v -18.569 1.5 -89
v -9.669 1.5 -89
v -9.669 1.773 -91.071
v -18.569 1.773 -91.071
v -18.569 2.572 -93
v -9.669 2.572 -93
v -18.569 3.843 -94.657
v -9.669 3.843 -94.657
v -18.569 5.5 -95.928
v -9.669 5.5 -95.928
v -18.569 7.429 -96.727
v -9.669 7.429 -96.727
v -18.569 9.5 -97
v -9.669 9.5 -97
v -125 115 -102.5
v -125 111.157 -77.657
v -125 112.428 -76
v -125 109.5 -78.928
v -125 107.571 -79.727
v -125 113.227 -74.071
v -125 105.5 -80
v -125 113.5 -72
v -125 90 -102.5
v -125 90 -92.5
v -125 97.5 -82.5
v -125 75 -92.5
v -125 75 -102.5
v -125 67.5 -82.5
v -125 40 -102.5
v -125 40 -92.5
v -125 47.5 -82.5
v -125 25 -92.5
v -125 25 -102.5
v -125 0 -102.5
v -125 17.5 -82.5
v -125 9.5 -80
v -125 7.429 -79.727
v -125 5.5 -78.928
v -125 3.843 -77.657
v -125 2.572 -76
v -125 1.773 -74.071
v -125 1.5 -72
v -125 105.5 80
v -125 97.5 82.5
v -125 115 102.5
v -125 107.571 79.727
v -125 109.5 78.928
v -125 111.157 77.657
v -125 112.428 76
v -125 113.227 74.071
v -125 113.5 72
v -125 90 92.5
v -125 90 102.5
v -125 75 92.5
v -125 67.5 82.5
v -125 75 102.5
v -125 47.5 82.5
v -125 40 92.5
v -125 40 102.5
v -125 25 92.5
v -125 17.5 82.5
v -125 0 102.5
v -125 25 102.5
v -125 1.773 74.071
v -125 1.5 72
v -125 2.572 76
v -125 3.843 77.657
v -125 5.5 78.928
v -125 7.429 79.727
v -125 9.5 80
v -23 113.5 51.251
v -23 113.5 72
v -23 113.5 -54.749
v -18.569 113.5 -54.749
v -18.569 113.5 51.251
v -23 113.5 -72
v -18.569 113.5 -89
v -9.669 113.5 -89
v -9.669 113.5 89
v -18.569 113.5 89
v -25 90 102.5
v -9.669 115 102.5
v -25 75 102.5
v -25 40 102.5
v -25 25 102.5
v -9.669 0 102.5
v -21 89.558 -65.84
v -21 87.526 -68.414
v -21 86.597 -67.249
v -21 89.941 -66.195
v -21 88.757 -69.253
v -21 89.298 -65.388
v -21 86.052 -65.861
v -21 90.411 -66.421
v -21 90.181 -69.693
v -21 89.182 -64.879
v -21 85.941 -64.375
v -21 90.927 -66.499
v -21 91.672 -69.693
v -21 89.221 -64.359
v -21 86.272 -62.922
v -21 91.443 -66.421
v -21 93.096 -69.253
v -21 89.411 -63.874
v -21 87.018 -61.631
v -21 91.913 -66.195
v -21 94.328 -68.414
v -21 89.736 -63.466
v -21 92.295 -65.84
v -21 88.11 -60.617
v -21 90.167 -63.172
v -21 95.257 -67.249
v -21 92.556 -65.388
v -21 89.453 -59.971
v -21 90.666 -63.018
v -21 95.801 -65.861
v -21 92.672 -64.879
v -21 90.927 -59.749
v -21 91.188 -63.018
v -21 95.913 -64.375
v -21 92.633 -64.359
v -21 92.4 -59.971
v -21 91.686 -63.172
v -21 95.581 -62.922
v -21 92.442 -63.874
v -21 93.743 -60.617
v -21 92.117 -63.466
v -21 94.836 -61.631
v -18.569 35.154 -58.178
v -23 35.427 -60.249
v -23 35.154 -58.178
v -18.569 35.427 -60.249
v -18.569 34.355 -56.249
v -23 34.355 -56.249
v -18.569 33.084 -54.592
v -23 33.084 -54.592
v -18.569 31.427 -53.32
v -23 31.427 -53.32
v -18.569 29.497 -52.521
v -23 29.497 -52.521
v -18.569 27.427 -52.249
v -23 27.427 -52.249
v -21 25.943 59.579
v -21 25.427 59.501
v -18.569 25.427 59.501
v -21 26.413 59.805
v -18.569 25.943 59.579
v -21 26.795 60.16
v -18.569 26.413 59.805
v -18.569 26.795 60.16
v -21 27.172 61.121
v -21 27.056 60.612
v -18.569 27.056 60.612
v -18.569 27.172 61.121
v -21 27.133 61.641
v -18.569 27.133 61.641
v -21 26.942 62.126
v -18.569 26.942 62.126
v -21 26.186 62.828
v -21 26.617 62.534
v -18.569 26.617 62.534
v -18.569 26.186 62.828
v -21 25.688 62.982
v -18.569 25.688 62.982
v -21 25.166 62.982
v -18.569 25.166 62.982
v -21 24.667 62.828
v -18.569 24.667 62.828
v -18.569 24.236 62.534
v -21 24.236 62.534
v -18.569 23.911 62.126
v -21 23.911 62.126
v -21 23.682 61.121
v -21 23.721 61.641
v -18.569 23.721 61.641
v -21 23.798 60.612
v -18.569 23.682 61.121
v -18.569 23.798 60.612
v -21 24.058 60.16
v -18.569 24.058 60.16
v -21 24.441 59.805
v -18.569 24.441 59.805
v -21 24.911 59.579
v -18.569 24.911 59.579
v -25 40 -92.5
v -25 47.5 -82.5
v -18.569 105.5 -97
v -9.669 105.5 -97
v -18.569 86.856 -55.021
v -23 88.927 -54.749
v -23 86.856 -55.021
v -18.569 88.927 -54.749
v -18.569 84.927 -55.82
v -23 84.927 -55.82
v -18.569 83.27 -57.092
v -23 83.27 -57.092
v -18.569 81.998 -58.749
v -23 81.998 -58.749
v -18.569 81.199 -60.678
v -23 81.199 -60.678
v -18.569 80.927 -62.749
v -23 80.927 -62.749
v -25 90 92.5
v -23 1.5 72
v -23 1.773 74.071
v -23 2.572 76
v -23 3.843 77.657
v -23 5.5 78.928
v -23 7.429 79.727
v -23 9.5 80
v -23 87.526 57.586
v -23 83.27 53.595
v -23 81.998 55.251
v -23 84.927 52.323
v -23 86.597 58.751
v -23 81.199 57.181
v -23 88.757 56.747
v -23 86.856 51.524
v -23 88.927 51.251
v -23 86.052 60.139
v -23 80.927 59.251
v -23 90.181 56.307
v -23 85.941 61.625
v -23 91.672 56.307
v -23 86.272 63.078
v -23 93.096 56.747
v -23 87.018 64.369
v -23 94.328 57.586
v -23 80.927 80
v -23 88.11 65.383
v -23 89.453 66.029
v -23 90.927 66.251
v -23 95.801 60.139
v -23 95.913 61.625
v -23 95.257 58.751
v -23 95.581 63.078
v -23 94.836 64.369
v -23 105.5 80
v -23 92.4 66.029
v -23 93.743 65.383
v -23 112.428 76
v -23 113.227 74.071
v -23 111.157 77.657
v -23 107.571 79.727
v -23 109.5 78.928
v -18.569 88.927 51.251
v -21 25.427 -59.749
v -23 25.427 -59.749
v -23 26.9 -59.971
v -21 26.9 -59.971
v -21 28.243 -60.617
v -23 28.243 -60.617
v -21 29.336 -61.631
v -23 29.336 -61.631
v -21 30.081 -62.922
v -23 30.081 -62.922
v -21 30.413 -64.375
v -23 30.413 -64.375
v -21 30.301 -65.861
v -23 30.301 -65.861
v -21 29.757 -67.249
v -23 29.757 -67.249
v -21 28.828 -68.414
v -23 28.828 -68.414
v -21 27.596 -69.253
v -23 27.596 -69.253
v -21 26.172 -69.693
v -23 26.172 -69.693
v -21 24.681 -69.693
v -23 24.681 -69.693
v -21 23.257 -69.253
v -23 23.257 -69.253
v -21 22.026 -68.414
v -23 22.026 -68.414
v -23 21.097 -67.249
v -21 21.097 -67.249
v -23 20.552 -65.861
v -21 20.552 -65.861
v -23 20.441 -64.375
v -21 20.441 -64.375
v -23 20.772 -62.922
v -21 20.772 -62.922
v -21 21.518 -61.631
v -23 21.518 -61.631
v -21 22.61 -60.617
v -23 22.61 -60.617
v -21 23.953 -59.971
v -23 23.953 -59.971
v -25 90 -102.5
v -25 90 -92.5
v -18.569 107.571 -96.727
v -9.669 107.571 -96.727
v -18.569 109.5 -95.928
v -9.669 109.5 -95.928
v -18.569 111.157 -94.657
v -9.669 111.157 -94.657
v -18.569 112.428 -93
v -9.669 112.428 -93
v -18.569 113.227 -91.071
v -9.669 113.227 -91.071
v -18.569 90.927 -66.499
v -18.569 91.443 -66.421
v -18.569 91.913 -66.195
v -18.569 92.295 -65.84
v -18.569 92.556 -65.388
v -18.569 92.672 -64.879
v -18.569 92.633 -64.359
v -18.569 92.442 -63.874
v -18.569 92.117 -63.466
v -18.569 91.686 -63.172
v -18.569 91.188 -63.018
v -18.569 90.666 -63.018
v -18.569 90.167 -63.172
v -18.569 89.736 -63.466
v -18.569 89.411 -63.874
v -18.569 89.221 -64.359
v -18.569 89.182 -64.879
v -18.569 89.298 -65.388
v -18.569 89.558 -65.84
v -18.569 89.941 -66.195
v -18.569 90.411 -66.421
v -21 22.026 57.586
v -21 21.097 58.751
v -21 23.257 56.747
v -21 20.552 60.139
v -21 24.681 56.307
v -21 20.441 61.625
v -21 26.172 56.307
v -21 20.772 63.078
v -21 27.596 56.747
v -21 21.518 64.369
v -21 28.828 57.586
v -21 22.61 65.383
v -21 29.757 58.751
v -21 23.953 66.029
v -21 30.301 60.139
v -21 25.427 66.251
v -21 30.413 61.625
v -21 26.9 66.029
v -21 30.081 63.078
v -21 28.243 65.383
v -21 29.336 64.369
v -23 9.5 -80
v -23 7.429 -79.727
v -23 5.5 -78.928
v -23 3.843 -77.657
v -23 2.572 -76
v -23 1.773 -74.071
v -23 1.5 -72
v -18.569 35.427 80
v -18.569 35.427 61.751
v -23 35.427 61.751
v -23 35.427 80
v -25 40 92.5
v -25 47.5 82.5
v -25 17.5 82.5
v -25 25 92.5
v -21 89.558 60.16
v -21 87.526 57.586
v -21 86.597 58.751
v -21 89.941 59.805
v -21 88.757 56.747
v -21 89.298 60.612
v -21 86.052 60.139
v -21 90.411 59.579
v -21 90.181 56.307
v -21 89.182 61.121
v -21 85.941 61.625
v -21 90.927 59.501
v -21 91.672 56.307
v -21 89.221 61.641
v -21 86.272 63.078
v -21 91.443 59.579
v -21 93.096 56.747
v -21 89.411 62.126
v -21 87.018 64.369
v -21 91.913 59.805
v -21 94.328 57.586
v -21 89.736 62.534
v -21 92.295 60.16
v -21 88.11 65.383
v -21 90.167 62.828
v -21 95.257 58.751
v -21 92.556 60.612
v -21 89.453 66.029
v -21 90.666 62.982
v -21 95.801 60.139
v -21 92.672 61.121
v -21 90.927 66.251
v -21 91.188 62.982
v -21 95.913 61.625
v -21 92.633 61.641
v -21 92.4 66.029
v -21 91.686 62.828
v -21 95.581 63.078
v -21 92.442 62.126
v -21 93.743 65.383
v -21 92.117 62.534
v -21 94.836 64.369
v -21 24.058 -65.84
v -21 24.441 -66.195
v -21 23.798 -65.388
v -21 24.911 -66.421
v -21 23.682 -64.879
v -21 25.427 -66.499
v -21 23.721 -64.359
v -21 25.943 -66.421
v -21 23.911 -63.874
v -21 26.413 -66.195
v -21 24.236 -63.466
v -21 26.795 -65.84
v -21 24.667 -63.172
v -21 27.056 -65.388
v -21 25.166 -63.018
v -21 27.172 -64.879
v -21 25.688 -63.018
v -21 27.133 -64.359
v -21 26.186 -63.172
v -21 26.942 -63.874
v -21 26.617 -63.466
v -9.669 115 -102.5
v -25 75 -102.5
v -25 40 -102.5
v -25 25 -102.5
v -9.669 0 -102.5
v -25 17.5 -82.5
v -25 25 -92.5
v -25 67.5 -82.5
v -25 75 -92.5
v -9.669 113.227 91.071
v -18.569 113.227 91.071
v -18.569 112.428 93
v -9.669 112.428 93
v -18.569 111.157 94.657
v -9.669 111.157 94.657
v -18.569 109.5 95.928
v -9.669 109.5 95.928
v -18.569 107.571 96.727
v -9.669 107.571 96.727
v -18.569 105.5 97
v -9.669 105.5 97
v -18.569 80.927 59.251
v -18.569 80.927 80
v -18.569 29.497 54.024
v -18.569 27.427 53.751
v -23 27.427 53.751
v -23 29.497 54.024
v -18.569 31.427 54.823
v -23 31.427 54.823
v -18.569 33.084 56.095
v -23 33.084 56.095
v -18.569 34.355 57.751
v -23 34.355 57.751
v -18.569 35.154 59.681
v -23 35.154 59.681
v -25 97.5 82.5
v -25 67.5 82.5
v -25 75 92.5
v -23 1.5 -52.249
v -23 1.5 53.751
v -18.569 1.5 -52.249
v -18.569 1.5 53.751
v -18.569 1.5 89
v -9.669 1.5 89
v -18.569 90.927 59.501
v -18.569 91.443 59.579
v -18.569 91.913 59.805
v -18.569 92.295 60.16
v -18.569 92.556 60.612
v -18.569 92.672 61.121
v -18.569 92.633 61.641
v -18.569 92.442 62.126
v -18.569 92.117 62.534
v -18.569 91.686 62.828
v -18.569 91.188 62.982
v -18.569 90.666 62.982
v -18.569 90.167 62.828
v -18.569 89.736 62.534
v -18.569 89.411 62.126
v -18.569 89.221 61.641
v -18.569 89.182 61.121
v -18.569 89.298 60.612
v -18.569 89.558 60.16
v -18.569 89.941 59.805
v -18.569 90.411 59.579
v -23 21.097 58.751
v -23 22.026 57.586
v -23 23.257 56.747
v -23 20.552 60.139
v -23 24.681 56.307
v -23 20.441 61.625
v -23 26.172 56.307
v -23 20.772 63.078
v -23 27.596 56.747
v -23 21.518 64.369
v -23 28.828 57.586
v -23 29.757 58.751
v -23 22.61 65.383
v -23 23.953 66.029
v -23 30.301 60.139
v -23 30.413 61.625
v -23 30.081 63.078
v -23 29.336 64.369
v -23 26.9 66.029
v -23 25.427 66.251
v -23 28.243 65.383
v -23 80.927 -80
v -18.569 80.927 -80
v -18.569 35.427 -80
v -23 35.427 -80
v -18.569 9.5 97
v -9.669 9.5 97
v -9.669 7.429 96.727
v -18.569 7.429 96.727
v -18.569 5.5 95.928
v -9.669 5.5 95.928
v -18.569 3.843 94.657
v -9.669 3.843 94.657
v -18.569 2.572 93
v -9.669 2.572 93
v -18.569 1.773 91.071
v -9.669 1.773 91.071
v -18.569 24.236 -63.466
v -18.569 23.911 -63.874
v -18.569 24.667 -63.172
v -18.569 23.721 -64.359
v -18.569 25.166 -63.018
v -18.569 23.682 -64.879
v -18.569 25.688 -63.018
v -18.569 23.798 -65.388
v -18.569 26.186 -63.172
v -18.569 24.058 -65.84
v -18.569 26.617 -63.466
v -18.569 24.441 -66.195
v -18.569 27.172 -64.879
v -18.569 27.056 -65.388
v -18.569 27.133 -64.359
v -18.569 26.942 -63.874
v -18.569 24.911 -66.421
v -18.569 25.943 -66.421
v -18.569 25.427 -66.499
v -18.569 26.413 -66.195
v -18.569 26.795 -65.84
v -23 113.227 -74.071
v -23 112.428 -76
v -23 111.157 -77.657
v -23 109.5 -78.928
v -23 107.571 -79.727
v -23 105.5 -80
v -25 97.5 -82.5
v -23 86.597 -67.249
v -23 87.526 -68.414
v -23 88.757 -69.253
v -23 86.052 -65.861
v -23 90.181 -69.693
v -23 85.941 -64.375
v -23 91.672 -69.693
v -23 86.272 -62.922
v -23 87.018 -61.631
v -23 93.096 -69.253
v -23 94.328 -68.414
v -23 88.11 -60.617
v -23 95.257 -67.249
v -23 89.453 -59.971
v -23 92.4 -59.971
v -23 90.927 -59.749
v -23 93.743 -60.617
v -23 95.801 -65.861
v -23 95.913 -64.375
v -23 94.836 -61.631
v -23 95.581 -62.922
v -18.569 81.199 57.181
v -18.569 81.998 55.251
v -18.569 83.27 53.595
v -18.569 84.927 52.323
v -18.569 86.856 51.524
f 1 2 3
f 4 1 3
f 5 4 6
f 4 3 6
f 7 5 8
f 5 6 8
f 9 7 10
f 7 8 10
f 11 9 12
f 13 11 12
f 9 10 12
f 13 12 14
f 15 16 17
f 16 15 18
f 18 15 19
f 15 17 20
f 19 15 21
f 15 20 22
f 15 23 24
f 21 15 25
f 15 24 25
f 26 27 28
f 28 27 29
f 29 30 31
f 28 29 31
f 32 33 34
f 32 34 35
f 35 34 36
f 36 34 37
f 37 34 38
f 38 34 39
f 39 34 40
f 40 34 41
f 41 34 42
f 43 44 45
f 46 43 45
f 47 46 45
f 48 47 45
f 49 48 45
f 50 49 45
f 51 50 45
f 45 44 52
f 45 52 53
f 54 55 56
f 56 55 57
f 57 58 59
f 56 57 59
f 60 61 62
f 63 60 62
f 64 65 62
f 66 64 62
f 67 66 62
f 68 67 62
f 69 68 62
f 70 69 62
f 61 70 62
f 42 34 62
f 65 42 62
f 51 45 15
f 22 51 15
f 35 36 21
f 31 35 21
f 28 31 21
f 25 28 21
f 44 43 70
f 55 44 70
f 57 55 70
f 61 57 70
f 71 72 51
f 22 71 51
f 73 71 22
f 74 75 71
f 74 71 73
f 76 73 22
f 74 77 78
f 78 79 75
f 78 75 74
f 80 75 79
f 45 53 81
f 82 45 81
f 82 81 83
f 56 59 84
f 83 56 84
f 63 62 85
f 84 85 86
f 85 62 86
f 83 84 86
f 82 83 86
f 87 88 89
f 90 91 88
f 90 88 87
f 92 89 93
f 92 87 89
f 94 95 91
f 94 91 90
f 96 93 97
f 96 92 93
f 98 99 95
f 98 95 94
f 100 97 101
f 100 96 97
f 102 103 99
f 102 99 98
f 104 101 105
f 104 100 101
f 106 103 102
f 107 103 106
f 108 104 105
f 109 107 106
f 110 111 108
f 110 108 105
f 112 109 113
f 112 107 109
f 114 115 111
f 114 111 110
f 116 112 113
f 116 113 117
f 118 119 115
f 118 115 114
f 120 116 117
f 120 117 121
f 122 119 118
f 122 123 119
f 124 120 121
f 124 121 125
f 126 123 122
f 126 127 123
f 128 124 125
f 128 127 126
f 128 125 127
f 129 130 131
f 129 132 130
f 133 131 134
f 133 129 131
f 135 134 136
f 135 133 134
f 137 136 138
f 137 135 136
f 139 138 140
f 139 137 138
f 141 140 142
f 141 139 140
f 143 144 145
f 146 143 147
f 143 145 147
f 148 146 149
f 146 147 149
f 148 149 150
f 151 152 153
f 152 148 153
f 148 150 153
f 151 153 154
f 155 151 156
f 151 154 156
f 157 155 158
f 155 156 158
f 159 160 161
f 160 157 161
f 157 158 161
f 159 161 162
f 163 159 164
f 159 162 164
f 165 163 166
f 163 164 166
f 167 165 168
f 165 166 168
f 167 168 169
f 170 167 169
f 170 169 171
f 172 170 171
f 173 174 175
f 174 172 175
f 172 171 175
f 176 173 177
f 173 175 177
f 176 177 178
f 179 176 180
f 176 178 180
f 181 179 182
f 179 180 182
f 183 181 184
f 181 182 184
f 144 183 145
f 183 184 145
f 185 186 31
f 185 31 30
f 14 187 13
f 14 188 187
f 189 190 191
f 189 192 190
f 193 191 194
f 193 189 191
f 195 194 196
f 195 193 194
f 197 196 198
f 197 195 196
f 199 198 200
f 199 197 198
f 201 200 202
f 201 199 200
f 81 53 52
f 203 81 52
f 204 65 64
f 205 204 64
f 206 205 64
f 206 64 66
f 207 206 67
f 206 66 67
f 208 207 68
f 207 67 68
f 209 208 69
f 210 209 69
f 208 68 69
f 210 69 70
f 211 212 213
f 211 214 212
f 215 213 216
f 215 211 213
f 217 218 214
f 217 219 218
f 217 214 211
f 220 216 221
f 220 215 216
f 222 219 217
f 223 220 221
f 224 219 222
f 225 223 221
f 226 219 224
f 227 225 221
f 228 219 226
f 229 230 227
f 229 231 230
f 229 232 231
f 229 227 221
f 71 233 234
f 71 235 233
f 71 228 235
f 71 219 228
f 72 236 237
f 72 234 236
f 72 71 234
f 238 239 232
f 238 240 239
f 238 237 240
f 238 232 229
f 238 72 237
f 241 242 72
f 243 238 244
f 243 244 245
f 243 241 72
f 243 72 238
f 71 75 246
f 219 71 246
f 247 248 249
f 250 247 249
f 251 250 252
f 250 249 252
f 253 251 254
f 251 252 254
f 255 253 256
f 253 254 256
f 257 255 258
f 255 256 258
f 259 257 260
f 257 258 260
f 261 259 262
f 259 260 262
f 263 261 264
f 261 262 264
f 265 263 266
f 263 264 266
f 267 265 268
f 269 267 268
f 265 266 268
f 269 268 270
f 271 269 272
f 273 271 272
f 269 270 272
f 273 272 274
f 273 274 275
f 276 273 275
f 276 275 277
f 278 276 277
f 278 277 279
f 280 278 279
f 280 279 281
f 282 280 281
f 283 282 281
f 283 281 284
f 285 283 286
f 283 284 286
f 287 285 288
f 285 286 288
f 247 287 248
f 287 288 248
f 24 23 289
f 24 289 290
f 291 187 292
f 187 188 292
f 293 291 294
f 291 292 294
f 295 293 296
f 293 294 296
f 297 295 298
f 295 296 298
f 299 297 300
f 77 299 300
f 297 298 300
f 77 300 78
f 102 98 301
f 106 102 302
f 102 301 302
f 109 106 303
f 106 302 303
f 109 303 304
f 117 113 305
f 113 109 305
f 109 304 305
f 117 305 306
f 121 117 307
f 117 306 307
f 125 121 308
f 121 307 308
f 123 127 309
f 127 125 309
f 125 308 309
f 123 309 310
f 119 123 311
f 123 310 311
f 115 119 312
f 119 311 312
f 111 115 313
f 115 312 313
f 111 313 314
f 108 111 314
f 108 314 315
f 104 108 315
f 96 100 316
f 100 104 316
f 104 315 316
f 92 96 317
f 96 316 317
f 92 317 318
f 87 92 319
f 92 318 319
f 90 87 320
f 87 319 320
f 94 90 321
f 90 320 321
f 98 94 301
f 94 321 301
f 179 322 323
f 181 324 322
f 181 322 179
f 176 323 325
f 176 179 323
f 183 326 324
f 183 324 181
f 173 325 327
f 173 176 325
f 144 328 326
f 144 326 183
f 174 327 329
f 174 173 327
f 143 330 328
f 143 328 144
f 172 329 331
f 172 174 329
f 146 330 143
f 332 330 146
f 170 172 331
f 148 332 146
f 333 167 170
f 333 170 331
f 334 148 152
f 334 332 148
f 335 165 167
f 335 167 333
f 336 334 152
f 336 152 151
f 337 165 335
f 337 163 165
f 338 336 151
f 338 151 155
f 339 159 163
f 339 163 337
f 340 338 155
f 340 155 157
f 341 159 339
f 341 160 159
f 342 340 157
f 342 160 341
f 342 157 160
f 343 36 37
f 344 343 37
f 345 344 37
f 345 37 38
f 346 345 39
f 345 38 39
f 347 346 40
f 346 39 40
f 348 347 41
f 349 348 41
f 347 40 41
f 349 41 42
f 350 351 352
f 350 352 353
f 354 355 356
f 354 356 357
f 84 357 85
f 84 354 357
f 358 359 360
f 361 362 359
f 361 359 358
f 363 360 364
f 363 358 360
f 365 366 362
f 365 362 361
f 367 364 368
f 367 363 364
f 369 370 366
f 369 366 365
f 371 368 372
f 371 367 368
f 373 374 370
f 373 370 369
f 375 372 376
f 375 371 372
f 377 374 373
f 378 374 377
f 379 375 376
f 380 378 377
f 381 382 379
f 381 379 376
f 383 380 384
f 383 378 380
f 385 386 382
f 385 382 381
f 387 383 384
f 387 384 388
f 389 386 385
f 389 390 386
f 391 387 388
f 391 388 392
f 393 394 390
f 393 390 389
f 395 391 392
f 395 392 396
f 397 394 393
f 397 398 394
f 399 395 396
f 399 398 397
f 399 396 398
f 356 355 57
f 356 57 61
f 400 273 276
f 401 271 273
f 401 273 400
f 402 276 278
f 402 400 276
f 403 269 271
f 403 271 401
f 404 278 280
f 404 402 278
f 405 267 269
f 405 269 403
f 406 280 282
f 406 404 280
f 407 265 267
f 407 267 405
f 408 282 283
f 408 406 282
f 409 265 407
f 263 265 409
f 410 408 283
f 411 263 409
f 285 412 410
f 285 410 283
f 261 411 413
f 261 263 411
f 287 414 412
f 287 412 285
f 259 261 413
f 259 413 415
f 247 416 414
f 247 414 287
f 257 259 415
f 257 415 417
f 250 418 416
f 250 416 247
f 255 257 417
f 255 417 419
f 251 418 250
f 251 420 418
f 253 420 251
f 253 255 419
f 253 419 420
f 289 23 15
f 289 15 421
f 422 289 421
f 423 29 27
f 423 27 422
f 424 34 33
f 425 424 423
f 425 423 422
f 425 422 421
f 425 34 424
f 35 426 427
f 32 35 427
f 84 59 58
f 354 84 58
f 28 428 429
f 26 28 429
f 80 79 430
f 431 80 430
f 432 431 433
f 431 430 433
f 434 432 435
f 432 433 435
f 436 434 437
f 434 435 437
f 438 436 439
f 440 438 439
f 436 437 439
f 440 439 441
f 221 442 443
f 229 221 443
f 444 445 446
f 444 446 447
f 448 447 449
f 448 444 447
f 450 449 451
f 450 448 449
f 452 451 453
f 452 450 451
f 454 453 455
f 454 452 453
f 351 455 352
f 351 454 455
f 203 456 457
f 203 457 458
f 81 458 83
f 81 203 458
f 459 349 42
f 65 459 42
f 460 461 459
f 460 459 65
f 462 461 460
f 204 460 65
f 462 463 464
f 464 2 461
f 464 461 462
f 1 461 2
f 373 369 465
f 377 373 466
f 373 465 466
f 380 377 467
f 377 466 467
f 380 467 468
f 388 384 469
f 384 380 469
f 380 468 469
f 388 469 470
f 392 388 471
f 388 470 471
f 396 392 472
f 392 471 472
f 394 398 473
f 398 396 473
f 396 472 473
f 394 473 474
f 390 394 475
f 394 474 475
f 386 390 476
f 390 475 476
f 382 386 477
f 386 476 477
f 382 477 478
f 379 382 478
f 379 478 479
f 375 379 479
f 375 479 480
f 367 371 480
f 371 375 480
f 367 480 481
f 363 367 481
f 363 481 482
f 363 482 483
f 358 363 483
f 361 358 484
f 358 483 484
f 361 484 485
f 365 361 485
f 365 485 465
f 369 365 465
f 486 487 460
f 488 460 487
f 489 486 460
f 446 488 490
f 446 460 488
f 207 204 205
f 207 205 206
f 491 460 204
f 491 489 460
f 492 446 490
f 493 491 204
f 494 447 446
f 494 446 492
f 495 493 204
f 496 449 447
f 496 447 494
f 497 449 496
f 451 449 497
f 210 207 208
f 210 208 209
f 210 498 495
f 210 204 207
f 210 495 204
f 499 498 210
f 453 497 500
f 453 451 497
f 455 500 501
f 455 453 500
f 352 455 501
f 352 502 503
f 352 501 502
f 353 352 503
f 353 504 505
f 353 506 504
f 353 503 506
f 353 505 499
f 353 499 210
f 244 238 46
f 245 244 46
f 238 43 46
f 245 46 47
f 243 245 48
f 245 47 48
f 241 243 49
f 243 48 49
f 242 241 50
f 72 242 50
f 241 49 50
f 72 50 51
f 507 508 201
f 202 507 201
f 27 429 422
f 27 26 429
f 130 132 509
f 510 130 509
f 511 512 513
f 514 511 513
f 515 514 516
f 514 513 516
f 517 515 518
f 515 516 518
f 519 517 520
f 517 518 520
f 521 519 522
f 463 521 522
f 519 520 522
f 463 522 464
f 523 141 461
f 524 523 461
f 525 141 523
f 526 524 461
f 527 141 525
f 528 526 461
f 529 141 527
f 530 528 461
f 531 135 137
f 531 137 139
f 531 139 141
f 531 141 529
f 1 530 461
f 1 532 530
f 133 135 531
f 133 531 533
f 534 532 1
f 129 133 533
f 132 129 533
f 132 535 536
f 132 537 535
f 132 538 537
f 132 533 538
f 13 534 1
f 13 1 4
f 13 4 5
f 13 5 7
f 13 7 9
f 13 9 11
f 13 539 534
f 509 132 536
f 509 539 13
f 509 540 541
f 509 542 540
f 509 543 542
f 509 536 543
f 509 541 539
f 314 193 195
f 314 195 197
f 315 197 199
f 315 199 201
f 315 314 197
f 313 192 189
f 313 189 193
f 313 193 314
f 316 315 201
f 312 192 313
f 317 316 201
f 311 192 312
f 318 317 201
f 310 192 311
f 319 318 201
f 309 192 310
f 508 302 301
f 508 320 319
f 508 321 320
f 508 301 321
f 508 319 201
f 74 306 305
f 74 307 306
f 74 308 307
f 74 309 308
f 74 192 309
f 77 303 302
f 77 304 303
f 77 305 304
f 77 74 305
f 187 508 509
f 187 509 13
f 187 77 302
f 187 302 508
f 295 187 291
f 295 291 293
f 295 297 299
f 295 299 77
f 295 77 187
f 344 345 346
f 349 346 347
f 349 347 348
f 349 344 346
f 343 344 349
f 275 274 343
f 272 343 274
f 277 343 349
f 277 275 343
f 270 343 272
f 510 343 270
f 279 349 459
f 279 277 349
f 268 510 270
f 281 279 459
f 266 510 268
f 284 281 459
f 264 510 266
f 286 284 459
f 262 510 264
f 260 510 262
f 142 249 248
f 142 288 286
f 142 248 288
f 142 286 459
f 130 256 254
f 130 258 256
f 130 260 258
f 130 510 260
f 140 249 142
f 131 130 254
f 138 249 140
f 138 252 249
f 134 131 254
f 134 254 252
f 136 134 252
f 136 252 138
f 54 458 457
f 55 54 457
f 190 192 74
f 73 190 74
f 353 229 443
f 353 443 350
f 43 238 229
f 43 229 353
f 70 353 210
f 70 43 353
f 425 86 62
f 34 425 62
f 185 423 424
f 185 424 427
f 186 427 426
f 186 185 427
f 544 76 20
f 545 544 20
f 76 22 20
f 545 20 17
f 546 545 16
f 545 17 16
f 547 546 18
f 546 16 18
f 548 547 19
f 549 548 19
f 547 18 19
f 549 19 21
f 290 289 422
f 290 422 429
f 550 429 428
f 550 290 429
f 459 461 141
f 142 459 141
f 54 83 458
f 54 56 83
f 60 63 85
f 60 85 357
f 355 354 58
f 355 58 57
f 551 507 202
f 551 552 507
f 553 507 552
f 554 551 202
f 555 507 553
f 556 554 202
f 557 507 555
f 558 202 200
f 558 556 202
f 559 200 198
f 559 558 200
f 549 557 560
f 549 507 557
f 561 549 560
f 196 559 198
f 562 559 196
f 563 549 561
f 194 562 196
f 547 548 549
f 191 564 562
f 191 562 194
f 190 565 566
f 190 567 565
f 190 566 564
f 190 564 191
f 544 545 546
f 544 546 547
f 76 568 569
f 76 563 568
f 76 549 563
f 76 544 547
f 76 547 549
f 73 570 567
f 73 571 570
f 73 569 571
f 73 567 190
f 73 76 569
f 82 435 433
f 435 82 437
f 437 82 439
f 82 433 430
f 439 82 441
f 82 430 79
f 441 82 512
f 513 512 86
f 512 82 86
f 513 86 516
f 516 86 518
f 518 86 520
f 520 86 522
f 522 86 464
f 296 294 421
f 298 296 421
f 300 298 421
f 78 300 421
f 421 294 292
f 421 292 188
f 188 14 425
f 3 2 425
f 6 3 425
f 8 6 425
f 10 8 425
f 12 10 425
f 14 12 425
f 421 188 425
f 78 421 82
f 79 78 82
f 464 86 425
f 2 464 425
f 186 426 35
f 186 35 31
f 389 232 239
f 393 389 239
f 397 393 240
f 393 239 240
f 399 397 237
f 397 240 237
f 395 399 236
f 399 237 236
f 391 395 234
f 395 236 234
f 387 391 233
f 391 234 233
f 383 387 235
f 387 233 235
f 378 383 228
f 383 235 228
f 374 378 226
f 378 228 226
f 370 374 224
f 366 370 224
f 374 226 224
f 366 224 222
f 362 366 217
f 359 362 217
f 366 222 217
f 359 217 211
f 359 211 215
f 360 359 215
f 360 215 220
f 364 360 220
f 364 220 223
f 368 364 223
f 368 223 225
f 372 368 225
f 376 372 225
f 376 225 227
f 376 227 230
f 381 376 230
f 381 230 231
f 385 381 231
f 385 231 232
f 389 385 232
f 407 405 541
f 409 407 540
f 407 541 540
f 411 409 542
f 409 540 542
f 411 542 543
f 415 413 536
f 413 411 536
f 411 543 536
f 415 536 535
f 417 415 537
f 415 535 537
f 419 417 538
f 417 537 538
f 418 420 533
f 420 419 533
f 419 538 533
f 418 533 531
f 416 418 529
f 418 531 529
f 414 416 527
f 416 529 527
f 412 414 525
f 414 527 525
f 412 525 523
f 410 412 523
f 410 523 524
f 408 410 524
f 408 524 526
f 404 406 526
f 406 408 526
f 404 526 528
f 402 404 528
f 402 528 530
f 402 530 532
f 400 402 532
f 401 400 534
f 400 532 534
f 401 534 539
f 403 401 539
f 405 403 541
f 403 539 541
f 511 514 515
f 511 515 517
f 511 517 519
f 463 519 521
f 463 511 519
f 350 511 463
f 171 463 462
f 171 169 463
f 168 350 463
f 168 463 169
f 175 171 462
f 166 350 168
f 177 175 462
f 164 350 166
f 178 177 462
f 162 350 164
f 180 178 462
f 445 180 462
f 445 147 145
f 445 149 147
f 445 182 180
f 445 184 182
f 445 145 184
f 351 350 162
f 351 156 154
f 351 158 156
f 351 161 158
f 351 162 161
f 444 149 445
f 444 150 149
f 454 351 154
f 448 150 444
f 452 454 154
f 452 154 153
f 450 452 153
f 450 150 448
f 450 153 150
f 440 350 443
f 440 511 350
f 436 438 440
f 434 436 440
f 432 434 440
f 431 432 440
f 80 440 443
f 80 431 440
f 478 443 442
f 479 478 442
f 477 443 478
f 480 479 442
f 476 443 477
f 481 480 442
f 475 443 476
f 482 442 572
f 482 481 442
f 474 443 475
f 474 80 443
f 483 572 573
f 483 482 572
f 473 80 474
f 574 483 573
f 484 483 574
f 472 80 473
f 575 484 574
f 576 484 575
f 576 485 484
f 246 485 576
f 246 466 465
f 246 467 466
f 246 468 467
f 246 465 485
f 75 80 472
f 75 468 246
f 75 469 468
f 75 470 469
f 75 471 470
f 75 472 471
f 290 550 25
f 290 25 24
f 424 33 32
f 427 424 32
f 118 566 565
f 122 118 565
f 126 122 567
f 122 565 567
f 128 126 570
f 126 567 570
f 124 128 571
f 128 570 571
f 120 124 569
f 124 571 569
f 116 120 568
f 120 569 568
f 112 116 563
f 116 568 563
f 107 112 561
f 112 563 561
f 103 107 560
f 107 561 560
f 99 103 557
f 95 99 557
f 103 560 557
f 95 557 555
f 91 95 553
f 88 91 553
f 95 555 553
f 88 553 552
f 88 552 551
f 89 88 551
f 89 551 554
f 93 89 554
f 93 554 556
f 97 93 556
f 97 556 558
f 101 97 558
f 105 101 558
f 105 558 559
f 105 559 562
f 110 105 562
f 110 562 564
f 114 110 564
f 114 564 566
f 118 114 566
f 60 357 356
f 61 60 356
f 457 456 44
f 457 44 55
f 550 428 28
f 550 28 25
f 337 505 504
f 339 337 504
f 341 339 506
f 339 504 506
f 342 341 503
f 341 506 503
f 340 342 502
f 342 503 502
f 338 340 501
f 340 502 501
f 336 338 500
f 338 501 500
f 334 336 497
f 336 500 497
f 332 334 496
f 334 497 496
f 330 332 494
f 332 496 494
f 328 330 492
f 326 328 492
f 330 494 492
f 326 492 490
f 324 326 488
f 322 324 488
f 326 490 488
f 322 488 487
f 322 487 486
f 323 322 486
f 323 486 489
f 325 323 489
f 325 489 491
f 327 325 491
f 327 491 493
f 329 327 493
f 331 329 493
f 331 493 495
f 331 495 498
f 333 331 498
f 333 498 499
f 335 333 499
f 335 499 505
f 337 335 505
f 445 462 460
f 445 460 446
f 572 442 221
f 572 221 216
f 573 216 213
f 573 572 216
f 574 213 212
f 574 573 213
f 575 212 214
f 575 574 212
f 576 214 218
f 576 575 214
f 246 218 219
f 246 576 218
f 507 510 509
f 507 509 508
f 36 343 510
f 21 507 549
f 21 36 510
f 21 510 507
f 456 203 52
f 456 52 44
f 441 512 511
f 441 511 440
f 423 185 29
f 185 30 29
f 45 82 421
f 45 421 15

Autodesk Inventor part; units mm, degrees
ref_plane "YZ Plane" through (0, 0, 0) normal (1, 0, 0) x (0, 1, 0)
ref_plane "XZ Plane" through (0, 0, 0) normal (0, 1, 0) x (-1, 0, 0)
ref_plane "XY Plane" through (0, 0, 0) normal (0, 0, 1) x (1, 0, 0)
sketch "Sketch12" plane through (0, 0, 0) normal (0, 1, 0) x (-1, 0, 0)
  line L0 (0, 0) -> (0, -102.5) construction
  line L1 (0, 0) -> (0, 102.5) construction
  line L2 (0, 102.5) -> (125, 102.5) construction
  line L3 (125, 102.5) -> (125, -102.5) construction
  line L4 (125, -102.5) -> (0, -102.5) construction
  line L5 (0, -102.5) -> (0, 102.5) construction
  line L6 (0, 102.5) -> (45, 102.5) construction
  line L7 (45, 102.5) -> (45, -102.5) construction
  line L8 (45, -102.5) -> (0, -102.5) construction
  line L9 (0, -102.5) -> (0, 102.5) construction
  line L10 (125, 0) -> (125, -217.5) construction
  line L11 (125, 0) -> (125, 217.5) construction
  line L12 (125, 217.5) -> (72.0108, 217.5) construction
  line L13 (45, 217.5) -> (45, 102.5) construction
  line L14 (125, -217.5) -> (72.0108, -217.5) construction
  line L15 (45, -217.5) -> (45, -102.5) construction
  arc A0 (34.5307, 191.4729) -> (34.5307, -191.4729) centre (548.125, 0) ccw construction
  arc A1 (34.5307, -191.4729) -> (72.0108, -217.5) centre (72.0108, -177.5) ccw construction
  arc A2 (72.0108, 217.5) -> (34.5307, 191.4729) centre (72.0108, 177.5) ccw construction
  line L16 (125, -102.5) -> (125, 102.5)
  line L17 (125, 102.5) -> (9.6691, 102.5)
  line L18 (125, -102.5) -> (9.6691, -102.5)
  arc A3 (9.6691, 102.5) -> (9.6691, -102.5) centre (548.125, 0) ccw construction
  line L19 (9.6691, 102.5) -> (9.6691, -102.5)
  dimension "d698" = 102.5
  dimension "d699" = 102.5
  dimension "d700" = 125
  dimension "d701" = 45
  dimension "d702" = 217.5
  dimension "d703" = 217.5
  dimension "d704" = 40
extrude "Extrusion12" add sketch "Sketch12" along normal blind 115
sketch "Sketch84" plane through (-125, 0, -102.5) normal (-1, 0, 0) x (0, 0, 1)
  line L0 (30.5, 113.5) -> (174.5, 113.5)
  line L1 (182.5, 105.5) -> (182.5, 9.5)
  line L2 (174.5, 1.5) -> (30.5, 1.5)
  line L3 (22.5, 9.5) -> (22.5, 105.5)
  line L4 (205, 0) -> (205, 115) projected
  line L5 (0, 0) -> (0, 115) projected
  line L6 (0, 115) -> (205, 115) projected
  line L7 (0, 0) -> (205, 0) projected
  arc A0 (30.5, 113.5) -> (22.5, 105.5) centre (30.5, 105.5) ccw
  arc A1 (182.5, 105.5) -> (174.5, 113.5) centre (174.5, 105.5) ccw
  arc A2 (174.5, 1.5) -> (182.5, 9.5) centre (174.5, 9.5) ccw
  arc A3 (22.5, 9.5) -> (30.5, 1.5) centre (30.5, 9.5) ccw
  point P0 (102.5, 0)
  dimension "d705" = 22.5
  dimension "d706" = 22.5
  dimension "d707" = 1.5
  dimension "d708" = 1.5
  dimension "d709" = 8
extrude "Extrusion69" cut sketch "Sketch84" against normal blind 102 contours L0 A1 L1 A2 L2 A3 L3 A0
sketch "Sketch85" plane through (-125, 0, -102.5) normal (-1, 0, 0) x (0, 0, 1)
  line L0 (205, 0) -> (205, 97) projected
  line L1 (205, 25) -> (205, 40)
  line L2 (205, 32.5) -> (185, 32.5) construction
  line L3 (185, 32.5) -> (185, 47.5)
  line L4 (185, 32.5) -> (185, 17.5)
  line L5 (205, 40) -> (195, 40)
  line L6 (195, 40) -> (185, 47.5)
  line L7 (205, 25) -> (195, 25)
  line L8 (195, 25) -> (185, 17.5)
  line L9 (0, 0) -> (205, 0) projected
  line L10 (205, 75) -> (205, 90)
  line L11 (205, 82.5) -> (185, 82.5) construction
  line L12 (185, 82.5) -> (185, 97.5)
  line L13 (185, 82.5) -> (185, 67.5)
  line L14 (205, 75) -> (195, 75)
  line L15 (195, 75) -> (185, 67.5)
  line L16 (205, 90) -> (195, 90)
  line L17 (195, 90) -> (185, 97.5)
  line L18 (0, 115) -> (205, 115) projected
  line L19 (0, 0) -> (0, 115) projected
  line L20 (0, 25) -> (10, 25)
  line L21 (0, 25) -> (10, 25) construction
  line L22 (0, 25) -> (0, 40)
  line L23 (10, 40) -> (0, 40)
  line L24 (0, 32.5) -> (20, 32.5) construction
  line L25 (20, 32.5) -> (20, 47.5)
  line L26 (20, 47.5) -> (10, 40)
  line L27 (20, 32.5) -> (20, 17.5)
  line L28 (20, 17.5) -> (10, 25)
  line L29 (0, 90) -> (10, 90)
  line L30 (0, 90) -> (0, 75)
  line L31 (10, 75) -> (0, 75)
  line L32 (0, 82.5) -> (20, 82.5) construction
  line L33 (20, 82.5) -> (20, 97.5)
  line L34 (20, 97.5) -> (10, 90)
  line L35 (20, 82.5) -> (20, 67.5)
  line L36 (20, 67.5) -> (10, 75)
  point P0 (102.5, 0)
  dimension "d712" = 15
  dimension "d713" = 20
  dimension "d714" = 15
  dimension "d715" = 15
  dimension "d717" = 10
  dimension "d718" = 25
  dimension "d719" = 15
  dimension "d720" = 20
  dimension "d721" = 15
  dimension "d722" = 15
  dimension "d723" = 10
  dimension "d728" = 25
  dimension "d732" = 10
  dimension "d734" = 20
  dimension "d735" = 15
  dimension "d736" = 15
extrude "Extrusion70" cut sketch "Sketch85" against normal blind 100
sketch "Sketch86" plane through (-9.6691, 0, 102.5) normal (1, 0, 0) x (0, 0, -1)
  line L0 (0, 90) -> (0, 115) construction
  line L1 (0, 0) -> (205, 0) construction
  line L2 (0, 115) -> (205, 0) construction
  line L3 (0, 115) -> (205, 115) construction
  line L4 (205, 115) -> (0, 0) construction
  line L5 (191.5, 1.5) -> (13.5, 1.5)
  line L6 (5.5, 9.5) -> (5.5, 105.5)
  line L7 (13.5, 113.5) -> (191.5, 113.5)
  line L8 (199.5, 105.5) -> (199.5, 9.5)
  line L9 (199.5, 1.5) -> (5.5, 113.5) construction
  line L10 (5.5, 1.5) -> (199.5, 113.5) construction
  arc A0 (13.5, 113.5) -> (5.5, 105.5) centre (13.5, 105.5) ccw
  arc A1 (199.5, 105.5) -> (191.5, 113.5) centre (191.5, 105.5) ccw
  arc A2 (191.5, 1.5) -> (199.5, 9.5) centre (191.5, 9.5) ccw
  arc A3 (5.5, 9.5) -> (13.5, 1.5) centre (13.5, 9.5) ccw
  point P0 (102.5, 0)
  point P1 (102.5, 57.5)
  dimension "d738" = 194
  dimension "d739" = 112
  dimension "d740" = 8
extrude "Extrusion71" cut sketch "Sketch86" against normal blind 8.9
sketch "Sketch90" plane through (-18.5691, 0, 102.5) normal (1, 0, 0) x (0, 0, -1)
  circle A0 centre (41.2486, 90.9267) radius 1.75
  circle A1 centre (167.2486, 25.4267) radius 1.75
  circle A2 centre (41.2486, 25.4267) radius 1.75
  circle A3 centre (167.2486, 90.9267) radius 1.75
  line L0 (198.9986, 106.9003) -> (198.9986, 7.9003)
  line L1 (190.9986, 1.9267) -> (13.9986, 1.9267) construction
  line L2 (5.9986, 9.9267) -> (5.9986, 104.9267) construction
  line L3 (13.9986, 112.9267) -> (190.9986, 112.9267) construction
  line L4 (198.9986, 104.9267) -> (198.9986, 9.9267) construction
  arc A4 (13.9986, 112.9267) -> (5.9986, 104.9267) centre (13.9986, 104.9267) ccw
  arc A5 (198.9986, 104.9267) -> (190.9986, 112.9267) centre (190.9986, 104.9267) ccw
  arc A6 (190.9986, 1.9267) -> (198.9986, 9.9267) centre (190.9986, 9.9267) ccw
  arc A7 (5.9986, 9.9267) -> (13.9986, 1.9267) centre (13.9986, 9.9267) ccw
  line L5 (21.3986, 106.3267) -> (186.7486, 106.3267) construction
  line L6 (186.7486, 106.3267) -> (186.7486, 5.5767) construction
  line L7 (186.7486, 5.5767) -> (21.3986, 5.5767) construction
  line L8 (21.3986, 5.5767) -> (21.3986, 106.3267) construction
  line L9 (33.7486, 94.9267) -> (48.7486, 94.9267) construction
  line L10 (48.7486, 94.9267) -> (48.7486, 86.9267) construction
  line L11 (48.7486, 86.9267) -> (33.7486, 86.9267) construction
  line L12 (33.7486, 86.9267) -> (33.7486, 94.9267) construction
  line L13 (33.7486, 94.9267) -> (48.7486, 86.9267) construction
  line L14 (48.7486, 94.9267) -> (33.7486, 86.9267) construction
  line L15 (33.7486, 29.4267) -> (48.7486, 29.4267) construction
  line L16 (48.7486, 29.4267) -> (48.7486, 21.4267) construction
  line L17 (48.7486, 21.4267) -> (33.7486, 21.4267) construction
  line L18 (33.7486, 21.4267) -> (33.7486, 29.4267) construction
  line L19 (33.7486, 29.4267) -> (48.7486, 21.4267) construction
  line L20 (48.7486, 29.4267) -> (33.7486, 21.4267) construction
  line L21 (159.7486, 29.4267) -> (174.7486, 29.4267) construction
  line L22 (174.7486, 29.4267) -> (174.7486, 21.4267) construction
  line L23 (174.7486, 21.4267) -> (159.7486, 21.4267) construction
  line L24 (159.7486, 21.4267) -> (159.7486, 29.4267) construction
  line L25 (159.7486, 29.4267) -> (174.7486, 21.4267) construction
  line L26 (174.7486, 29.4267) -> (159.7486, 21.4267) construction
  line L27 (159.7486, 94.9267) -> (174.7486, 94.9267) construction
  line L28 (174.7486, 94.9267) -> (174.7486, 86.9267) construction
  line L29 (174.7486, 86.9267) -> (159.7486, 86.9267) construction
  line L30 (159.7486, 86.9267) -> (159.7486, 88.953) construction
  line L31 (159.7486, 94.9267) -> (174.7486, 86.9267) construction
  line L32 (174.7486, 94.9267) -> (159.7486, 86.9267) construction
  line L33 (159.7486, 94.9267) -> (159.7486, 84.9003) construction
  line L34 (0, 90) -> (0, 115) construction
  line L35 (205, 0) -> (205, 25) construction
  line L36 (0, 115) -> (205, 0) construction
  line L37 (205, 0) -> (205, 115) construction
  line L38 (0, 0) -> (0, 115) construction
  line L39 (0, 0) -> (205, 115) construction
  line L40 (182.5, 9.5) -> (182.5, 105.5) projected
  line L41 (13.5, 113.5) -> (191.5, 113.5) projected
  line L42 (191.5, 1.5) -> (13.5, 1.5) projected
  line L43 (5.5, 9.5) -> (5.5, 105.5) projected
  line L44 (199.5, 105.5) -> (199.5, 9.5) projected
  line L45 (182.5, 80.9267) -> (165.2486, 80.9267)
  line L46 (13.5, 113.5) -> (191.5, 113.5) projected
  arc A8 (182.5, 105.5) -> (174.5, 113.5) centre (174.5, 105.5) ccw projected
  line L47 (174.5, 113.5) -> (30.5, 113.5) construction
  line L48 (174.5, 113.5) -> (30.5, 113.5) construction
  line L49 (157.2486, 88.9267) -> (157.2486, 113.5)
  arc A9 (157.2486, 88.9267) -> (165.2486, 80.9267) centre (165.2486, 88.9267) ccw
  line L50 (157.2486, 113.5) -> (174.5, 113.5)
  line L51 (182.5, 80.9267) -> (182.5, 105.5)
  arc A10 (182.5, 105.5) -> (174.5, 113.5) centre (174.5, 105.5) ccw
  line L52 (154.7486, 5.5767) -> (154.7486, 27.4267)
  line L53 (162.7486, 35.4267) -> (182.5, 35.4267)
  arc A11 (174.5, 1.5) -> (182.5, 9.5) centre (174.5, 9.5) ccw projected
  line L54 (182.5, 9.5) -> (182.5, 35.4267)
  line L55 (174.5, 1.5) -> (154.7486, 1.5)
  arc A12 (174.5, 1.5) -> (182.5, 9.5) centre (174.5, 9.5) ccw
  arc A13 (162.7486, 35.4267) -> (154.7486, 27.4267) centre (162.7486, 27.4267) ccw
  line L56 (48.7486, 1.5) -> (48.7486, 27.4267)
  line L57 (40.7486, 35.4267) -> (22.5, 35.4267)
  line L58 (22.5, 105.5) -> (22.5, 9.5) projected
  line L59 (22.5, 9.5) -> (22.5, 35.4267)
  line L60 (30.5, 1.5) -> (48.7486, 1.5)
  arc A14 (22.5, 9.5) -> (30.5, 1.5) centre (30.5, 9.5) ccw projected
  arc A15 (22.5, 9.5) -> (30.5, 1.5) centre (30.5, 9.5) ccw
  arc A16 (48.7486, 27.4267) -> (40.7486, 35.4267) centre (40.7486, 27.4267) ccw
  line L61 (51.2486, 113.5) -> (51.2486, 88.9267)
  line L62 (43.2486, 80.9267) -> (22.5, 80.9267)
  line L63 (22.5, 80.9267) -> (22.5, 105.5)
  line L64 (51.2486, 113.5) -> (30.5, 113.5)
  arc A17 (30.5, 113.5) -> (22.5, 105.5) centre (30.5, 105.5) ccw projected
  arc A18 (30.5, 113.5) -> (22.5, 105.5) centre (30.5, 105.5) ccw
  arc A19 (43.2486, 80.9267) -> (51.2486, 88.9267) centre (43.2486, 88.9267) ccw
  line L65 (22.5, 80.9267) -> (22.5, 35.4267)
  line L66 (22.5, 105.5) -> (22.5, 9.5) projected
  line L67 (51.2486, 113.5) -> (157.2486, 113.5)
  line L68 (182.5, 80.9267) -> (182.5, 35.4267)
  line L69 (154.7486, 5.5767) -> (154.7486, 1.5)
  line L70 (0, 0) -> (205, 0) projected
  line L71 (48.7486, 1.5) -> (48.7486, 1.9267)
  line L72 (154.7486, 1.5) -> (154.7486, 1.9267)
  line L73 (48.7486, 1.5) -> (154.7486, 1.5)
  line L74 (30.5, 1.5) -> (174.5, 1.5) projected
  point P0 (102.5, 0)
  point P1 (5.9986, 112.9267)
  point P2 (5.9986, 1.9267)
  point P3 (198.9986, 112.9267)
  point P4 (159.7486, 25.4267)
  point P5 (102.4986, 57.5003)
  point P6 (51.2486, 11.5)
  point P7 (179.5, 80.9267)
  point P8 (157.2486, 103.5)
  point P9 (48.7486, 1.5)
  point P10 (154.7486, 1.5)
  dimension "d840" = 3.5
  dimension "d841" = 3.5
  dimension "d842" = 3.5
  dimension "d843" = 3.5
  dimension "d844" = 193
  dimension "d845" = 111
  dimension "d846" = 8
  dimension "d847" = 8
  dimension "d848" = 165.35
  dimension "d849" = 100.75
  dimension "d850" = 3.65
  dimension "d851" = 15.4
  dimension "d852" = 15.4
  dimension "d853" = 19.85
  dimension "d854" = 19.85
  dimension "d855" = 15
  dimension "d856" = 8
  dimension "d857" = 15
  dimension "d858" = 15
  dimension "d859" = 8
  dimension "d860" = 19.5
  dimension "d861" = 19.85
  dimension "d862" = 19.5
  dimension "d863" = 19.85
  dimension "d864" = 12.25
  dimension "d865" = 0
  dimension "d868" = 15.4
  dimension "d869" = 6.6
  dimension "d870" = 12.25
  dimension "d892" = 8
  dimension "d893" = 8
  dimension "d894" = 8
  dimension "d895" = 8
  dimension "d902" = 10
  dimension "d903" = 10
  dimension "d904" = 10
  dimension "d905" = 10
extrude "Extrusion74" cut sketch "Sketch90" against normal blind 10 contours A0 | A1 | A2 | A3 | L53 A13 L52 L69 L42 L56 A16 L57 L58 L62 A19 L61 L41 L49 A9 L45 L40
sketch "Sketch91" plane through (-23, 0, -102.5) normal (-1, 0, 0) x (0, 0, 1)
  circle A0 centre (37.7514, 90.9267) radius 1.75 projected
  circle A1 centre (37.7514, 90.9267) radius 5
  circle A2 centre (163.7514, 90.9267) radius 1.75 projected
  circle A3 centre (163.7514, 90.9267) radius 5
  circle A4 centre (163.7514, 25.4267) radius 1.75 projected
  circle A5 centre (163.7514, 25.4267) radius 5
  circle A6 centre (37.7514, 25.4267) radius 1.75 projected
  circle A7 centre (37.7514, 25.4267) radius 5
  point P0 (102.5, 0)
  dimension "d896" = 10
  dimension "d897" = 10
  dimension "d898" = 10
  dimension "d899" = 10
extrude "Extrusion75" cut sketch "Sketch91" against normal blind 2
properties part number "center_fp13"
